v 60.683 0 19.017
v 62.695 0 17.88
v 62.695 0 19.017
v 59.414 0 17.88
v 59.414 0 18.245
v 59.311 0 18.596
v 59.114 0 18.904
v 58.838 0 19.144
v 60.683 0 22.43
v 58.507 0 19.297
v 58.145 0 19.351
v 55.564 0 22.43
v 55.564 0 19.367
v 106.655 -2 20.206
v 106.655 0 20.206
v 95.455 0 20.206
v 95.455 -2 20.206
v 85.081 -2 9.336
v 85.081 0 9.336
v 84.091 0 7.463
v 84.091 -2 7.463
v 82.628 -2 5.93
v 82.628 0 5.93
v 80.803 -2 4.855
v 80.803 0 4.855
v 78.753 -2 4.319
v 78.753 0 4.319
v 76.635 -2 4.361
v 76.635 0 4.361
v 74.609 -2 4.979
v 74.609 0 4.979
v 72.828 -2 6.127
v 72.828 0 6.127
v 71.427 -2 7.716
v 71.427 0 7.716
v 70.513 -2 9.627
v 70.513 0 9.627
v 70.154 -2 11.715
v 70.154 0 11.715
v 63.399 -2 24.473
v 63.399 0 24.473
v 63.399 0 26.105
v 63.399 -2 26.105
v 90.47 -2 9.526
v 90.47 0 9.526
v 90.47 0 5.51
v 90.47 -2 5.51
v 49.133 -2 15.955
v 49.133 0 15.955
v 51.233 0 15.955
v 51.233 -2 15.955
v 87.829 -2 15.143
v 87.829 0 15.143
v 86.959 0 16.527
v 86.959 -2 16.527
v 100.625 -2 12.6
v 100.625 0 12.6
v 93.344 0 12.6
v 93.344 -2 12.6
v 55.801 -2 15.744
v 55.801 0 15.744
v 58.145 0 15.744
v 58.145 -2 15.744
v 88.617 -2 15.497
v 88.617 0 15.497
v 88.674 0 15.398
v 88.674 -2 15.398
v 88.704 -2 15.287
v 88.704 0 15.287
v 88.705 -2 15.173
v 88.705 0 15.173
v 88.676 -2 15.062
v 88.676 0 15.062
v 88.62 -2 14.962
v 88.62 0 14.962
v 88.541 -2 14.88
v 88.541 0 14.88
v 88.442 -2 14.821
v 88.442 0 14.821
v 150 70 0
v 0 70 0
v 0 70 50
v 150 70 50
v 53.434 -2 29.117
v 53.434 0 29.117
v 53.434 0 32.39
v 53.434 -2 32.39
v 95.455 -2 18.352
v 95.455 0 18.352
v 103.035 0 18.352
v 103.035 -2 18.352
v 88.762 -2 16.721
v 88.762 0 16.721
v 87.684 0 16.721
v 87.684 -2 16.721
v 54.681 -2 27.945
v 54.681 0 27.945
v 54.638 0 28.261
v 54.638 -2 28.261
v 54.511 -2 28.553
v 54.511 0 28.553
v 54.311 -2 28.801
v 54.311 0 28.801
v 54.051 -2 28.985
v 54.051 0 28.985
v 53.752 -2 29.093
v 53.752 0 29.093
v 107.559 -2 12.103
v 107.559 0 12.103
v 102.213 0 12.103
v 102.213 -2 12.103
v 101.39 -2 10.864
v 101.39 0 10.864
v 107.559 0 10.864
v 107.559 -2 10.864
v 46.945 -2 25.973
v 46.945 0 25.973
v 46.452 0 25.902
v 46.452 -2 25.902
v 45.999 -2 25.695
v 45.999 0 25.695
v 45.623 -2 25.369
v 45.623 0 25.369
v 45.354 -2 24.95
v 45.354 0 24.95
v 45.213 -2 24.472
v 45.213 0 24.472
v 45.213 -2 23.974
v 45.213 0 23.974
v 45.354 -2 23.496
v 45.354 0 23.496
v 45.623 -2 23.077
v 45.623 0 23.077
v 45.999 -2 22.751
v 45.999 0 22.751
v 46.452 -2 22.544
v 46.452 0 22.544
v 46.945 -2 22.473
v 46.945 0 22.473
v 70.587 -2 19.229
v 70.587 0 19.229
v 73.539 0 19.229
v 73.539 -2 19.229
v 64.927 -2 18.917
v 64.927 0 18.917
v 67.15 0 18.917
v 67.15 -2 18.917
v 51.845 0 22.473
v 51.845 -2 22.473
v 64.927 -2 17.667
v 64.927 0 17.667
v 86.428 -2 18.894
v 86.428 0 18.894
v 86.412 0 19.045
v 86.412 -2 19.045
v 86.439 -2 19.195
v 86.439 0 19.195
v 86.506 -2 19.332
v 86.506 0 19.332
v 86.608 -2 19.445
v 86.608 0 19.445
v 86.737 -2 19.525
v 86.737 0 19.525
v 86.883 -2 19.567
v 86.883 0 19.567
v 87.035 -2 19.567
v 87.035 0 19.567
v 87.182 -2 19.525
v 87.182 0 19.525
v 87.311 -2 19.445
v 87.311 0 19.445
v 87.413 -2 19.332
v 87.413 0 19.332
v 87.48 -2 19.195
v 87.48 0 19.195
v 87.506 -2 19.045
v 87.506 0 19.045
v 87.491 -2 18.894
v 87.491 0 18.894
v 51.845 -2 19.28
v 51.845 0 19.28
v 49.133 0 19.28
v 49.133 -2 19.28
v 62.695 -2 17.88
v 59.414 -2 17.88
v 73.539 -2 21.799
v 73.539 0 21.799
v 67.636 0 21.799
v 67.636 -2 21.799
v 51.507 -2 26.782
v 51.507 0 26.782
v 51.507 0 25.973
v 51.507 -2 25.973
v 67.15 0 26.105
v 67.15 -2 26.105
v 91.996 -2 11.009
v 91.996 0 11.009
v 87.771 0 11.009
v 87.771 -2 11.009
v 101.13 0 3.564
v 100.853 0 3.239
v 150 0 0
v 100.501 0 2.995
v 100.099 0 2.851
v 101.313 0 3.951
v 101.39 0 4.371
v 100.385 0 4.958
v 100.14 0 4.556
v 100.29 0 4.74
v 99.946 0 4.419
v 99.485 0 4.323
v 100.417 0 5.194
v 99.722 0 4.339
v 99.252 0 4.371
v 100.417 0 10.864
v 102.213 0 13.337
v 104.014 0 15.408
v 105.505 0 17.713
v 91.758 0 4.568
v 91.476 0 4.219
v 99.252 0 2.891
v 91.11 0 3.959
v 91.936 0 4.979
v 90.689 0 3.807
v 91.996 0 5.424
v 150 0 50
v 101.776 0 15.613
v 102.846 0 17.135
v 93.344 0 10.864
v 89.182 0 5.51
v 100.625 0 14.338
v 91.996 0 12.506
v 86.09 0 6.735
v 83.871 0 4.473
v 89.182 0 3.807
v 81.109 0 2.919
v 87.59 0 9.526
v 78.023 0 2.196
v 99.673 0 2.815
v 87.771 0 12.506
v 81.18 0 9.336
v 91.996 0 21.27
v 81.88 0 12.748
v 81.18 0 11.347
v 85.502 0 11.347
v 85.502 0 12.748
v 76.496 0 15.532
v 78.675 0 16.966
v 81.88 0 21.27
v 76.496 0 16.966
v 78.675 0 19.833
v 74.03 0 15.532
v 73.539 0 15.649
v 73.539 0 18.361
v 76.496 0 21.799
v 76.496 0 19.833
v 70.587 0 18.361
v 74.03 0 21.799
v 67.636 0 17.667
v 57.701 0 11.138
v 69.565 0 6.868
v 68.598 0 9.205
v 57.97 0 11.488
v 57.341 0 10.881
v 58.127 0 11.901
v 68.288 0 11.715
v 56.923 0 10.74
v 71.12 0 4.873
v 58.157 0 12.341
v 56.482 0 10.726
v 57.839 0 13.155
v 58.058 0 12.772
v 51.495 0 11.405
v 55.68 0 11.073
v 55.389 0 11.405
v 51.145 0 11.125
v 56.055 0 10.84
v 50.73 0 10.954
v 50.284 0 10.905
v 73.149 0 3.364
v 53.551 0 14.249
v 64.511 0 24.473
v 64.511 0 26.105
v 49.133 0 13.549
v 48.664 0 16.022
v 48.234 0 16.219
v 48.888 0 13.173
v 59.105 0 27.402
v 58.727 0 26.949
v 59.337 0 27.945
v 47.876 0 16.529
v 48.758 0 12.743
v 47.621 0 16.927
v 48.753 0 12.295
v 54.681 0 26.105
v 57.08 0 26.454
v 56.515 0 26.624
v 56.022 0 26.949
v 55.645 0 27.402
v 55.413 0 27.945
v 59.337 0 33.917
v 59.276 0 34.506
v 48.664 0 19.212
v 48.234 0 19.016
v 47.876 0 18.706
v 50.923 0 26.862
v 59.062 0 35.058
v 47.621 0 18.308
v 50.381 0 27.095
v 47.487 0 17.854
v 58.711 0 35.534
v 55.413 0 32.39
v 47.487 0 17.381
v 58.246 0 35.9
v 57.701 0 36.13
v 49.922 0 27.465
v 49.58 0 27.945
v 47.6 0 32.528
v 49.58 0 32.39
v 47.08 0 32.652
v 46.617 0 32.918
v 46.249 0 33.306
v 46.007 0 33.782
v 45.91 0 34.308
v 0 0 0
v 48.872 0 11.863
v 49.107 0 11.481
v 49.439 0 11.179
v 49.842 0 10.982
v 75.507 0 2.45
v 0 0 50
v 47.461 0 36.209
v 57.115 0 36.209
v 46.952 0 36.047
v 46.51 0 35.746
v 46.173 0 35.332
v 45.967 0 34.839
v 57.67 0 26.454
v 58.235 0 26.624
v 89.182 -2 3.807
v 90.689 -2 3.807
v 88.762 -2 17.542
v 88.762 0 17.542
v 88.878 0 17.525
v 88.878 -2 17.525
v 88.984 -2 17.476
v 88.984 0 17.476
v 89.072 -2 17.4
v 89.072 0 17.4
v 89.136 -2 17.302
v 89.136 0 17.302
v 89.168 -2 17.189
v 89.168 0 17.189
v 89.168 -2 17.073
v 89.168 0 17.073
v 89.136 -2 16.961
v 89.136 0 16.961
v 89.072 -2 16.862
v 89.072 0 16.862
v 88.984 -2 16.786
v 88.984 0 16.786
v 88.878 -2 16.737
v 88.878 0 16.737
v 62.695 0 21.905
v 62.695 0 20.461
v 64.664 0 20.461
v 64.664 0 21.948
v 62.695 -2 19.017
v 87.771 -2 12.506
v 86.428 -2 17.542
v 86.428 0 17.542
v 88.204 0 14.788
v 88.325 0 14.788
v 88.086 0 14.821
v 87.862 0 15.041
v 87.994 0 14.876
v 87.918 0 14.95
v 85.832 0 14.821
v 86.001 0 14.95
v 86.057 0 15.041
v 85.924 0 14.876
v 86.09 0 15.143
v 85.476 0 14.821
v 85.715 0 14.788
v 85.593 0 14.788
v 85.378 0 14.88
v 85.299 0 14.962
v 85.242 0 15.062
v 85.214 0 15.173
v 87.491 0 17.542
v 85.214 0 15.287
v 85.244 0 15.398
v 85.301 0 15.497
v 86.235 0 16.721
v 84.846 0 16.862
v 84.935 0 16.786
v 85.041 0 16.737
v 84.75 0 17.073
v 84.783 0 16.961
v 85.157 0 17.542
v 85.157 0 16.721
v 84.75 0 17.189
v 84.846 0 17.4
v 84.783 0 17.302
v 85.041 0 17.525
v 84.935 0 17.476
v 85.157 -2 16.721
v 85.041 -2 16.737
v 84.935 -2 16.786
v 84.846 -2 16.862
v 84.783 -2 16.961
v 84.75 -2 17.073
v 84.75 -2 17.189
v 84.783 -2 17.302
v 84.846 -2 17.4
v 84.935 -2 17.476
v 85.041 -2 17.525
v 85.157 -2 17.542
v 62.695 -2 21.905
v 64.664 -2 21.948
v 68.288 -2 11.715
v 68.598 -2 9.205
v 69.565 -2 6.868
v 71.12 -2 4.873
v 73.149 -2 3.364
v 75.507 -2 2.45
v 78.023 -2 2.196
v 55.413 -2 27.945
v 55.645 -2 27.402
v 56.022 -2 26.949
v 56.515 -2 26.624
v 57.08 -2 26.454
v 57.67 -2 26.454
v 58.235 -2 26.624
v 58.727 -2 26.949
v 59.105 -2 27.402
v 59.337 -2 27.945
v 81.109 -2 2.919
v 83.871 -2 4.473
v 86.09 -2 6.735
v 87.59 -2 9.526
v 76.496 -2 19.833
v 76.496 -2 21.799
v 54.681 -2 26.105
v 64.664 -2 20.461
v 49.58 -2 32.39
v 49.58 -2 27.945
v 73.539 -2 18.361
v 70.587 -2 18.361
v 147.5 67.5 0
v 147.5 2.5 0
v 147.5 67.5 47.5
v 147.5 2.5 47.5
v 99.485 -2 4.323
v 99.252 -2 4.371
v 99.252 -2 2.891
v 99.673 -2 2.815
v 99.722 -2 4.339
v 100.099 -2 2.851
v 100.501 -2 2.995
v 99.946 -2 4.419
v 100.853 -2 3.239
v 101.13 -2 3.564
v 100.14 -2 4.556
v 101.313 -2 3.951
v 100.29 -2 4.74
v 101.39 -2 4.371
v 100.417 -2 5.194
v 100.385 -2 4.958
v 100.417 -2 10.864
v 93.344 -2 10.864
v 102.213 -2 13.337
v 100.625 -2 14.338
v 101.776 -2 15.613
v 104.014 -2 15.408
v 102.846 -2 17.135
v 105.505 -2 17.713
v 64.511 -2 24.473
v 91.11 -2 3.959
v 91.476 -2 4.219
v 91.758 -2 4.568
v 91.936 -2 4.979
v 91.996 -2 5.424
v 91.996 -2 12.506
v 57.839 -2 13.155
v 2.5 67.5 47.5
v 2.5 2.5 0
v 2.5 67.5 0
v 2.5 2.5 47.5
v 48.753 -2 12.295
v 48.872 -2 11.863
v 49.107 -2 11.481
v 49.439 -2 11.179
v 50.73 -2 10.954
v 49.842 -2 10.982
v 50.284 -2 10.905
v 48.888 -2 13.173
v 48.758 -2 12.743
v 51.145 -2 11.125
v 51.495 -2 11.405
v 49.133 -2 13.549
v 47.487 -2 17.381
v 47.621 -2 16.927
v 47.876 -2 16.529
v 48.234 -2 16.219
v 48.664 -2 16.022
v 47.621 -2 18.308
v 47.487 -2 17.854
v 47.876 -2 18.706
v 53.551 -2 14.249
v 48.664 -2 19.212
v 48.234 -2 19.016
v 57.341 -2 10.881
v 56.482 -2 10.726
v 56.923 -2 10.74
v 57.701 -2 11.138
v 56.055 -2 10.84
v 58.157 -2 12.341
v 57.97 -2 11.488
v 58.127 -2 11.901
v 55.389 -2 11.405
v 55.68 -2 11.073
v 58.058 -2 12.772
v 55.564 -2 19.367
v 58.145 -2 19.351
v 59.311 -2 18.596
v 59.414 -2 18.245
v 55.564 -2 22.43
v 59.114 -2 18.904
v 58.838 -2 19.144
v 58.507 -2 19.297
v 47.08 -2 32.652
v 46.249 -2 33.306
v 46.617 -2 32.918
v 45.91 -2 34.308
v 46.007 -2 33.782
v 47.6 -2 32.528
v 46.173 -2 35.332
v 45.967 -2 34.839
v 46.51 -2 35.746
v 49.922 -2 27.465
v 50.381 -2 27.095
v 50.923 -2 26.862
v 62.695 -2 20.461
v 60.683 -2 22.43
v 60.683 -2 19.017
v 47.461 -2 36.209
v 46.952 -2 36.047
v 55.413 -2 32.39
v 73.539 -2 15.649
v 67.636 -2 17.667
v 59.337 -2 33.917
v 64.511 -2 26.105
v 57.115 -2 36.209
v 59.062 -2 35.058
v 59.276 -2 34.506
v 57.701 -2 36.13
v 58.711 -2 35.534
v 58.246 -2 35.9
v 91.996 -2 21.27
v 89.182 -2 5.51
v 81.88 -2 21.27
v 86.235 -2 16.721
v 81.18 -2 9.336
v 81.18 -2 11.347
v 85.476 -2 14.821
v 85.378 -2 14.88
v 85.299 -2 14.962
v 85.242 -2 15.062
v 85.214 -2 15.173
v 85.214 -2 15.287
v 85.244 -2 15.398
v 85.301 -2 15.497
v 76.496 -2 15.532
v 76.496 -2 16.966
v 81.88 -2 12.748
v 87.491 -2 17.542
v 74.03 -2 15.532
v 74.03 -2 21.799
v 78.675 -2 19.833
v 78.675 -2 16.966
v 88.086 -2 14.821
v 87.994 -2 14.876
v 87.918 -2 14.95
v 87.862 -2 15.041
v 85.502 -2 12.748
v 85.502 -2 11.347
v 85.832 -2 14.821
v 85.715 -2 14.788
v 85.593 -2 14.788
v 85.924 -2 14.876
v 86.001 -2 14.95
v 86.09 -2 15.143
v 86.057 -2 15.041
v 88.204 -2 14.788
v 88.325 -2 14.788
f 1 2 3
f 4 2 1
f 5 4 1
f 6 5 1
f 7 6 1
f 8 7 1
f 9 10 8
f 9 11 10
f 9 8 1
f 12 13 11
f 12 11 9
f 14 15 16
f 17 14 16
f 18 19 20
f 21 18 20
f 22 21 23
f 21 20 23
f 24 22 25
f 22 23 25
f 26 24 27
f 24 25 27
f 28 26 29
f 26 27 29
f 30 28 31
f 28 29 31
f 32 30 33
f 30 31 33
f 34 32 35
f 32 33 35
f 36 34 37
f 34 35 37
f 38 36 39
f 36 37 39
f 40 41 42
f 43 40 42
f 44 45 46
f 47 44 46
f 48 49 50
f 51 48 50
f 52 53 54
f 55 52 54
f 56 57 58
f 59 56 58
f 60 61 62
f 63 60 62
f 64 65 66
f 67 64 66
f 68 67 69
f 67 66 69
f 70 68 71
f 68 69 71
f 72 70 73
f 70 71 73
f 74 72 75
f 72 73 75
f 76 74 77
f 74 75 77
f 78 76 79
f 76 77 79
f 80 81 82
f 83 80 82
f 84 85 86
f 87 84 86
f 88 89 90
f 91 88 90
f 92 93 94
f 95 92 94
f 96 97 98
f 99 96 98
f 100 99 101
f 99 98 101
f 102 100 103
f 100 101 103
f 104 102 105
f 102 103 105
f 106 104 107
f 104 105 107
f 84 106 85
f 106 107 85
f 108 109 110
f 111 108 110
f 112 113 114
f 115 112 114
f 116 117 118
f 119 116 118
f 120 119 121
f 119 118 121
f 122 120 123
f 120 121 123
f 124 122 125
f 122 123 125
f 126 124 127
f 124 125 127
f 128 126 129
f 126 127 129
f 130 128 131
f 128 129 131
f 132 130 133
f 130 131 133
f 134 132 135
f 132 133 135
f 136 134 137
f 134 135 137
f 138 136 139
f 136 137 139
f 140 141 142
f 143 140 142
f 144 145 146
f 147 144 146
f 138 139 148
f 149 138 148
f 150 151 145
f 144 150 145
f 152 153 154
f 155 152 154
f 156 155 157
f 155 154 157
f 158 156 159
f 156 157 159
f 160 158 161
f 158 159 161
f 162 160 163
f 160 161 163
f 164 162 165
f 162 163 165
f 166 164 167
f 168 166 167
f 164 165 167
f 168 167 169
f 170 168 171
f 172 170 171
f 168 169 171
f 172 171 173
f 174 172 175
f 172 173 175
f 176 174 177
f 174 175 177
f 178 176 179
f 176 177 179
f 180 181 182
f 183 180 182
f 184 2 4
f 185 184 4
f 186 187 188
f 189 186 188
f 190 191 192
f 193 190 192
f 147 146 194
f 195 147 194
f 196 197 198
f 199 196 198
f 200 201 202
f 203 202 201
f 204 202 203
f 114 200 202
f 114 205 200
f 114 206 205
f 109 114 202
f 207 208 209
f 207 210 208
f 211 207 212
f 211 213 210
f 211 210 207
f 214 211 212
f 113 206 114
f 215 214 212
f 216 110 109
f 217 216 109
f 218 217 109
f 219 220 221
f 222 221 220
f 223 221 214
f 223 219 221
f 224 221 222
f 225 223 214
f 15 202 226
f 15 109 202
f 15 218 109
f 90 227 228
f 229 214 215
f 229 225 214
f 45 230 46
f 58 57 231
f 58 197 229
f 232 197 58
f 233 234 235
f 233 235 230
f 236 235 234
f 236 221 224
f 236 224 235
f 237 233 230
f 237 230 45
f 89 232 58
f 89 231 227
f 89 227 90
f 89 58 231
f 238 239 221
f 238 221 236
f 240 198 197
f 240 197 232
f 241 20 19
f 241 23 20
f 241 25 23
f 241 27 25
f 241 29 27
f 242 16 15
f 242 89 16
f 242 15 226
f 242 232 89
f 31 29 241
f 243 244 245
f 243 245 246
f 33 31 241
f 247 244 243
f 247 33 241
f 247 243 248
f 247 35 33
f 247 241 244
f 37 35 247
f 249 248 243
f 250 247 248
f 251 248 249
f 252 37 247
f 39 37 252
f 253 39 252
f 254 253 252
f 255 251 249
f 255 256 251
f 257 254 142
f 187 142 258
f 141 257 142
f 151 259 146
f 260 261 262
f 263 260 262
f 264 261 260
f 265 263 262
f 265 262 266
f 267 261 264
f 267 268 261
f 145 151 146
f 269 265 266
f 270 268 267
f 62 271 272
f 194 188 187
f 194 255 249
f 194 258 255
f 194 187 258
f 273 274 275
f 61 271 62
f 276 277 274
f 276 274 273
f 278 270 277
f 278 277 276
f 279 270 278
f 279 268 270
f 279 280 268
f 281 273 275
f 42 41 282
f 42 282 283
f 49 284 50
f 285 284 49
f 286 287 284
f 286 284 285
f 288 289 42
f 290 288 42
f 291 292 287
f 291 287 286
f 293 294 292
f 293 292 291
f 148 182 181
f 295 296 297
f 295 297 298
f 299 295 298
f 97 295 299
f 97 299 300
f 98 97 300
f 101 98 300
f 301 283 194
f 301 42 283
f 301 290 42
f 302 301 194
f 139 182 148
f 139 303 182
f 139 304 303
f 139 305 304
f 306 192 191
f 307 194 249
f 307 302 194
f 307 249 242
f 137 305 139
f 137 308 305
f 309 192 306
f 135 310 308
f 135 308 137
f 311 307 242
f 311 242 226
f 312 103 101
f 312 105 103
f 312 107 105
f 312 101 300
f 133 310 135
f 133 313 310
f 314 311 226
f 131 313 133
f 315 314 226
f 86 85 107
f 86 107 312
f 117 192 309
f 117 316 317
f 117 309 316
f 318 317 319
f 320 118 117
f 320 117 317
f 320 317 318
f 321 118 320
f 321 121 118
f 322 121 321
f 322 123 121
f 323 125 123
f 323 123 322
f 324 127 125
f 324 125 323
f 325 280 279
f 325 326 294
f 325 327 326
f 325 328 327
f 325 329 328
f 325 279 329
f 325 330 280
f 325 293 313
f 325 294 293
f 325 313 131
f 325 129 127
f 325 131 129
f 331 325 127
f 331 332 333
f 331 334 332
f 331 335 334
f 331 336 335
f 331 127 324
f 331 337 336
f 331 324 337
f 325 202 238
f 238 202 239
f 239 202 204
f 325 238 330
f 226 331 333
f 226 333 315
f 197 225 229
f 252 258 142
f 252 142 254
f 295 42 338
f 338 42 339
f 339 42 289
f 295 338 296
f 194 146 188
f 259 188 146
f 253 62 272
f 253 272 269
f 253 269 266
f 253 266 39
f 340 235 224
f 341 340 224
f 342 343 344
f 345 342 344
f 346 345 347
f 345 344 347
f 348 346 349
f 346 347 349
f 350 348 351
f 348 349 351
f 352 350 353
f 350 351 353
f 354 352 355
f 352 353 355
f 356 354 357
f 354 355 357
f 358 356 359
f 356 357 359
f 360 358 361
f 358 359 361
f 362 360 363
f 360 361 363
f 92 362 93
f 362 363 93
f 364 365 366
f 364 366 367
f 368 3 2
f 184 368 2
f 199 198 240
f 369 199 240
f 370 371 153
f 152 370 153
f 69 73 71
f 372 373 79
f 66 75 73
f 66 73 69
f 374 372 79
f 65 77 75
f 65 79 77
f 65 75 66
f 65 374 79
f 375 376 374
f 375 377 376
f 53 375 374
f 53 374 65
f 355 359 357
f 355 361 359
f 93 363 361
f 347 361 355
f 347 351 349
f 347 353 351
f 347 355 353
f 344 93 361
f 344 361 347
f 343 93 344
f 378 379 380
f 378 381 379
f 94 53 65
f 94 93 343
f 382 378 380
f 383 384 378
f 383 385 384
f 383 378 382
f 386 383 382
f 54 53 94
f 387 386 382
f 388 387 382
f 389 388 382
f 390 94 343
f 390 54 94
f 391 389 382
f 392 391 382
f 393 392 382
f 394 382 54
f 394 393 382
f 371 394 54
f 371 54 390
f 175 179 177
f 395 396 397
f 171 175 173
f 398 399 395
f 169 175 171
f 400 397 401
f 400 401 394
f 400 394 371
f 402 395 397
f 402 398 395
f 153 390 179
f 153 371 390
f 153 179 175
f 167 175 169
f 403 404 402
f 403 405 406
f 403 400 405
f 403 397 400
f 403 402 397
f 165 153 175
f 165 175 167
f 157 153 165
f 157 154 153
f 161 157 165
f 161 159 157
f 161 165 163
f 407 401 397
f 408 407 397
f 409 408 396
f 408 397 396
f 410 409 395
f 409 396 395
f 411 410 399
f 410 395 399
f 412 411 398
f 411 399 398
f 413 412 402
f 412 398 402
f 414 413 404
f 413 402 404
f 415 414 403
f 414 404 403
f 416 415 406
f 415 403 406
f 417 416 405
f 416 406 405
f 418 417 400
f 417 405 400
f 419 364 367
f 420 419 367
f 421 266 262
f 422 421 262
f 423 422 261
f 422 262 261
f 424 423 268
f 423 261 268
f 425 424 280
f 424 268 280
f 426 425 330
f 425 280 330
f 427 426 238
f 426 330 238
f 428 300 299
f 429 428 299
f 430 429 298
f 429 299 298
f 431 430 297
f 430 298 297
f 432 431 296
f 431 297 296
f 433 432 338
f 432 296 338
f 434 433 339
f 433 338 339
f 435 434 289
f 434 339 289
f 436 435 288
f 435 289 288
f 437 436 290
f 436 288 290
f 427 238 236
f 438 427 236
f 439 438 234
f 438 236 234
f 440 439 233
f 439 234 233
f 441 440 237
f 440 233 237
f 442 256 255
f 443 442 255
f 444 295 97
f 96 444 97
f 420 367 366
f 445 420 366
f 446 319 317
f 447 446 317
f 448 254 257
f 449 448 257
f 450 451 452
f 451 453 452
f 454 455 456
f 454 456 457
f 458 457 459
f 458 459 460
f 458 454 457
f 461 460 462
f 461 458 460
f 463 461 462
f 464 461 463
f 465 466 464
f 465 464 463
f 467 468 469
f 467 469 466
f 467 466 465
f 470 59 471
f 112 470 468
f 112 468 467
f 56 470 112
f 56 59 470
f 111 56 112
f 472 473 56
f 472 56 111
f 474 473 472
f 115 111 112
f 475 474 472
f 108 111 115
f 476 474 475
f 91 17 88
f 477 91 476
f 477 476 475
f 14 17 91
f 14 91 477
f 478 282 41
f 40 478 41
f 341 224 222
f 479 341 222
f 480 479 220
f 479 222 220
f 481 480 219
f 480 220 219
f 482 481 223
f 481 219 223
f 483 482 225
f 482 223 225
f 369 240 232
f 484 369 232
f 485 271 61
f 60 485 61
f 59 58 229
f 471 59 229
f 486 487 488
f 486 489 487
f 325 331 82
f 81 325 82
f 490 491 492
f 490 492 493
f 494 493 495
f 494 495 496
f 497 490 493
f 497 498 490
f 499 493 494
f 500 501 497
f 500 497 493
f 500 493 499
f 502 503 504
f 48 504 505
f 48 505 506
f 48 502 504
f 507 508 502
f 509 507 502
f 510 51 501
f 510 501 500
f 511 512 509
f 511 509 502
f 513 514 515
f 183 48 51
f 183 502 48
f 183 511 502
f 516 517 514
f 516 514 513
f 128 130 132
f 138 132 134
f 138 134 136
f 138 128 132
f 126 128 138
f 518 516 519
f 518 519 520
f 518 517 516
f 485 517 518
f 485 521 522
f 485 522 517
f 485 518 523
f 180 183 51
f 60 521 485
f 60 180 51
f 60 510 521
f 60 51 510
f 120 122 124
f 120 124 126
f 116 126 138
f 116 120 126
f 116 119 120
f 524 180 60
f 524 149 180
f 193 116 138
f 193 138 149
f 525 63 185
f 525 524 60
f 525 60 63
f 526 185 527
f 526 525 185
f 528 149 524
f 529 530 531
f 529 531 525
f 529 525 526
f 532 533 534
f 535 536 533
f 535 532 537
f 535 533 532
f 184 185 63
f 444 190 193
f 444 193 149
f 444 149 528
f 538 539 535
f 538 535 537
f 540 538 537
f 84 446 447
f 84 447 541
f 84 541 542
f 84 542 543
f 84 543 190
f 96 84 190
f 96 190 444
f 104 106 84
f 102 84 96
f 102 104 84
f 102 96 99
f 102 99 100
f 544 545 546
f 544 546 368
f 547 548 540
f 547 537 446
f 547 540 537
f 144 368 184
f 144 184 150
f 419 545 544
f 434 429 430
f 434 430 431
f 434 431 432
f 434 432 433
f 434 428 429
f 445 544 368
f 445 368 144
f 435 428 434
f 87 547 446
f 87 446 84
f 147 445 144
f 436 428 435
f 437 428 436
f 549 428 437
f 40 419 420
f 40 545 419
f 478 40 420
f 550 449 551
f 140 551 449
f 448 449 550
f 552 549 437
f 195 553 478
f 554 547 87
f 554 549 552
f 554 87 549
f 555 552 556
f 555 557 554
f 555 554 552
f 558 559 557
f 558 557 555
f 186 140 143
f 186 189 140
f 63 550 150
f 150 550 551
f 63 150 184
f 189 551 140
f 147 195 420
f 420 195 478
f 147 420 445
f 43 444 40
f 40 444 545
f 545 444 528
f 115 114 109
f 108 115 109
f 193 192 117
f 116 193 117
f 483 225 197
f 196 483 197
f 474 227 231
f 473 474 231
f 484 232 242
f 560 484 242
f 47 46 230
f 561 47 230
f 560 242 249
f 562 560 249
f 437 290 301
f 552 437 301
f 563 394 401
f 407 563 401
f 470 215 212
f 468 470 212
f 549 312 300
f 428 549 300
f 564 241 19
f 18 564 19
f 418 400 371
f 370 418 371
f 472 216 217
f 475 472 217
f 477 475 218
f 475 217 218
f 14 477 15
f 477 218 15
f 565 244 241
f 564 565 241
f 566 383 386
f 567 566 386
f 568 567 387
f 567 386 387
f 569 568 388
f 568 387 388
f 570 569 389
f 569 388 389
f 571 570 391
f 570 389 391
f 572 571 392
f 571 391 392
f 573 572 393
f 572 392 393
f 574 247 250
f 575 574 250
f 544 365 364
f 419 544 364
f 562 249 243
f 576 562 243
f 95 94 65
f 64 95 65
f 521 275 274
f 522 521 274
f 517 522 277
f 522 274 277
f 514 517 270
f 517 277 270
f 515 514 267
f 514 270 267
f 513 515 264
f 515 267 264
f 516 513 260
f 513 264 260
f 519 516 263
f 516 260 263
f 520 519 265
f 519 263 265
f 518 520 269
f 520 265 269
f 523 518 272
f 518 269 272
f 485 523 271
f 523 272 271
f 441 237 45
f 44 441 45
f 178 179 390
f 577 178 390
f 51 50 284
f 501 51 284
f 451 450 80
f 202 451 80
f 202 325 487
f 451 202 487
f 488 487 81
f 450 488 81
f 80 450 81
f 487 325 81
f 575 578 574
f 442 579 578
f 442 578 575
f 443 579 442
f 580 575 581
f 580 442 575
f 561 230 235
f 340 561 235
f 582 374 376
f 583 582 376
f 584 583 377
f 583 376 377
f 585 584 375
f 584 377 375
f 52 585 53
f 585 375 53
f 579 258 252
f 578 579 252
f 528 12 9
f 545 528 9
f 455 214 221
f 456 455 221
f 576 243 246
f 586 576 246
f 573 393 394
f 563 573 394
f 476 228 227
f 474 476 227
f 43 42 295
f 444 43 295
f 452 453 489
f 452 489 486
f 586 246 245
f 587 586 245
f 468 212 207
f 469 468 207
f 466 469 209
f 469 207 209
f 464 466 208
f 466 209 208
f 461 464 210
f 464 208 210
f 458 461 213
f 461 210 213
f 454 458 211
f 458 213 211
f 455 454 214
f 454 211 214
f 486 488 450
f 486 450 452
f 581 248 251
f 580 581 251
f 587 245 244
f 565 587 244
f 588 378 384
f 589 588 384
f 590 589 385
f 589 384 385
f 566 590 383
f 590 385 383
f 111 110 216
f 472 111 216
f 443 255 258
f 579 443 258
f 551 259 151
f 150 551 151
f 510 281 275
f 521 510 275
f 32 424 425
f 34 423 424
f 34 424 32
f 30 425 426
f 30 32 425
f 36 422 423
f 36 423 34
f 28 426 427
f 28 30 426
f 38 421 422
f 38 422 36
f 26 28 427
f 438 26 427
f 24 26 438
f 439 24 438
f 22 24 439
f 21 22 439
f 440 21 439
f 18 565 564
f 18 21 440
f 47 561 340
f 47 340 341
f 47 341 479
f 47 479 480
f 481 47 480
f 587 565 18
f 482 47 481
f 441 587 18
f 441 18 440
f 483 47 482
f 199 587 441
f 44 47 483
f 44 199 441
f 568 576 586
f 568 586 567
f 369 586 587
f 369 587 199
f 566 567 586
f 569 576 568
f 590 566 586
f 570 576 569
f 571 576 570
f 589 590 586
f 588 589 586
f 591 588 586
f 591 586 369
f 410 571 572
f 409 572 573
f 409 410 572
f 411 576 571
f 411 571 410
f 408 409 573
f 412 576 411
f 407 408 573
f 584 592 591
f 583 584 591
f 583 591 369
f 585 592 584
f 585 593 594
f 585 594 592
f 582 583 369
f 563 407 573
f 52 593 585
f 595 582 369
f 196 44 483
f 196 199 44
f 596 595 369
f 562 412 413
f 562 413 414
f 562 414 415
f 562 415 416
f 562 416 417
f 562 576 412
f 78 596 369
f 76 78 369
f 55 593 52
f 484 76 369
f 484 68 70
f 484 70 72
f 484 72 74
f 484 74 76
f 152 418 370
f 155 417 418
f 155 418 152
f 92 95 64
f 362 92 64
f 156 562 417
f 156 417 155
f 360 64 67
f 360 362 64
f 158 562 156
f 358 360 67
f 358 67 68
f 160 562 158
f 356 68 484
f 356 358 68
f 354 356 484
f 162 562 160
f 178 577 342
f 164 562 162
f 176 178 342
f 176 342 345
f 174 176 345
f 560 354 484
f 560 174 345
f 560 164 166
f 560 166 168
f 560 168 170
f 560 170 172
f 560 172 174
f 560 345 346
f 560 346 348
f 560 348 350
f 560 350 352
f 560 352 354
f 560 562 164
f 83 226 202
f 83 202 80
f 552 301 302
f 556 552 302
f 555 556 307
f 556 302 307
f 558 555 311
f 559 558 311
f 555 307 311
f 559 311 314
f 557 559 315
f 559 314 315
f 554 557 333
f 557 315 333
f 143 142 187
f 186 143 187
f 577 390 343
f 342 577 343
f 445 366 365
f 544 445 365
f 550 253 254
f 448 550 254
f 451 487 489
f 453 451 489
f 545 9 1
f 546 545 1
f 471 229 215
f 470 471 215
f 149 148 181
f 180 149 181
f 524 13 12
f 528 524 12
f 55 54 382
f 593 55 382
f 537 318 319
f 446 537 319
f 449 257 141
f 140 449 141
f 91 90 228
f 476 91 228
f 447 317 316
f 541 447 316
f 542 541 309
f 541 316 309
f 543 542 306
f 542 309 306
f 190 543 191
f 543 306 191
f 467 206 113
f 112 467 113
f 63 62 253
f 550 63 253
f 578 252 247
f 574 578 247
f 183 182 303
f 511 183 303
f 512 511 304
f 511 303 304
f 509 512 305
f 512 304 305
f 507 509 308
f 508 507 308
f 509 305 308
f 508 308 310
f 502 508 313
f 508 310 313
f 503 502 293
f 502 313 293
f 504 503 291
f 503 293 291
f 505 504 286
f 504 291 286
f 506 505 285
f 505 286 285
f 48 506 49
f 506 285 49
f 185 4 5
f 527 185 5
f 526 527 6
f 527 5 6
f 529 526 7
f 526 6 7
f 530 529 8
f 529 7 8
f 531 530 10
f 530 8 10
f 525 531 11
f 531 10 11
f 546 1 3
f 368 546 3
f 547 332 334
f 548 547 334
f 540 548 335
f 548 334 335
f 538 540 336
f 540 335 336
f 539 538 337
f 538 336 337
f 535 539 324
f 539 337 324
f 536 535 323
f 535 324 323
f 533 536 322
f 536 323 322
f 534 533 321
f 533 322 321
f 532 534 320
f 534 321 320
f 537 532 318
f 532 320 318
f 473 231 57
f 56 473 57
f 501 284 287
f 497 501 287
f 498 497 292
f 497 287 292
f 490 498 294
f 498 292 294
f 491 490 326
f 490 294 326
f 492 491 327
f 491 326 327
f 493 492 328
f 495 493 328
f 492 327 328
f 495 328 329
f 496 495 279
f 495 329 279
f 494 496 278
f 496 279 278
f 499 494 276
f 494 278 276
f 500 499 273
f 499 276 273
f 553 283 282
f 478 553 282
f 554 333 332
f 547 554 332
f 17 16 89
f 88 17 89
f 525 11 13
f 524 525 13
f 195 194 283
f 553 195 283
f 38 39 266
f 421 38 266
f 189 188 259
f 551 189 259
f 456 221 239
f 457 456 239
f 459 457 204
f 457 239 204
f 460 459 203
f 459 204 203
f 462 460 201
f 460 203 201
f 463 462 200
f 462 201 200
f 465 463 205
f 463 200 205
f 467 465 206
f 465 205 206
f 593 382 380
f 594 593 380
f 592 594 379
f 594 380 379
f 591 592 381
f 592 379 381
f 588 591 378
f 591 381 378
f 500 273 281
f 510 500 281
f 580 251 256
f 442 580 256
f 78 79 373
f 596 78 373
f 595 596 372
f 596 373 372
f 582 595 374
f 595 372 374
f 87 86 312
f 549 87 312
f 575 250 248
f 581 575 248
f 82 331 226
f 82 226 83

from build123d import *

# Parameters (mm, degrees)
F0_W     = 70
F0_H     = 50
F1_DEPTH = 150
F2_T     = -2.5
F4_DEPTH = 2


with BuildPart() as f1:
    # F0 (on Right) → F1 (new body)
    with BuildSketch(Plane.YZ):
        with Locations((35, 25)):
            Rectangle(F0_W, F0_H)
    extrude(amount=F1_DEPTH)

    # F2
    f2_openings = [f1.faces().sort_by_distance(p)[0] for p in [
        (75, 35, 0),
    ]]
    offset(amount=F2_T, openings=f2_openings)

    # F3 (on Front) → F4 (join)
    with BuildSketch(Plane.XZ):
        with BuildLine():
            Line((57.11453, 36.209103), (47.46139, 36.209103))
            ThreePointArc((47.46139, 36.209103), (45.909707, 34.307581), (47.600284, 32.528408))
            Line((47.600284, 32.528408), (49.579524, 32.389514))
            Line((49.579524, 32.389514), (49.579524, 27.944904))
            ThreePointArc((49.579524, 27.944904), (50.38126, 27.095251), (51.50668, 26.782002))
            ThreePointArc((51.50668, 26.782002), (52.632099, 27.095251), (53.433836, 27.944904))
            Line((53.433836, 27.944904), (53.433836, 29.116847))
            Line((53.433836, 29.116847), (53.433836, 32.389514))
            Line((53.433836, 32.389514), (55.413075, 32.389514))
            Line((55.413075, 32.389514), (55.413075, 27.944904))
            ThreePointArc((55.413075, 27.944904), (57.374954, 26.432392), (59.336834, 27.944904))
            Line((59.336834, 27.944904), (59.336834, 33.917353))
            ThreePointArc((59.336834, 33.917353), (58.710678, 35.533527), (57.11453, 36.209103))
        make_face()
        with BuildLine():
            ThreePointArc((53.433836, 27.944904), (52.632099, 27.095251), (51.50668, 26.782002))
            Line((51.50668, 26.782002), (51.50668, 25.973246))
            Line((51.50668, 25.973246), (46.945356, 25.973246))
            ThreePointArc((46.945356, 25.973246), (45.1954, 24.223289), (46.945356, 22.473333))
            Line((46.945356, 22.473333), (51.845234, 22.473333))
            Line((51.845234, 22.473333), (51.845234, 19.279664))
            Line((51.845234, 19.279664), (49.132802, 19.279664))
            ThreePointArc((49.132802, 19.279664), (47.470343, 17.617206), (49.132802, 15.954748))
            Line((49.132802, 15.954748), (51.232748, 15.954748))
            Line((51.232748, 15.954748), (49.132802, 13.548559))
            ThreePointArc((49.132802, 13.548559), (49.262718, 11.31813), (51.495243, 11.404863))
            Line((51.495243, 11.404863), (53.551439, 14.24854))
            Line((53.551439, 14.24854), (55.388894, 11.404863))
            ThreePointArc((55.388894, 11.404863), (57.530578, 10.996438), (57.838831, 13.154818))
            Line((57.838831, 13.154818), (55.80093, 15.74391))
            Line((55.80093, 15.74391), (58.145076, 15.74391))
            Line((58.145076, 15.74391), (73.538758, 15.648505))
            Line((73.538758, 15.648505), (73.538758, 18.361211))
            Line((73.538758, 18.361211), (70.587255, 18.361211))
            Line((70.587255, 18.361211), (70.587255, 19.2293))
            Line((70.587255, 19.2293), (73.538758, 19.2293))
            Line((73.538758, 19.2293), (73.538758, 21.79884))
            Line((73.538758, 21.79884), (67.63576, 21.79884))
            Line((67.63576, 21.79884), (67.63576, 17.66674))
            Line((67.63576, 17.66674), (64.927325, 17.66674))
            Line((64.927325, 17.66674), (64.927325, 18.916788))
            Line((64.927325, 18.916788), (67.149632, 18.916788))
            Line((67.149632, 18.916788), (67.149632, 26.104558))
            Line((67.149632, 26.104558), (64.510643, 26.104558))
            Line((64.510643, 26.104558), (64.510643, 24.472551))
            Line((64.510643, 24.472551), (63.399486, 24.472551))
            Line((63.399486, 24.472551), (63.399486, 26.104558))
            Line((63.399486, 26.104558), (54.681171, 26.104558))
            Line((54.681171, 26.104558), (54.681171, 27.944904))
            ThreePointArc((54.681171, 27.944904), (54.310984, 28.800663), (53.433836, 29.116847))
            Line((53.433836, 29.116847), (53.433836, 27.944904))
        make_face()
        with BuildLine():
            Line((55.563889, 19.367162), (55.563889, 22.429585))
            Line((55.563889, 22.429585), (60.682509, 22.429585))
            Line((60.682509, 22.429585), (60.682509, 19.017169))
            Line((60.682509, 19.017169), (62.694959, 19.017169))
            Line((62.694959, 19.017169), (62.694959, 17.8797))
            Line((62.694959, 17.8797), (59.413794, 17.8797))
            ThreePointArc((59.413794, 17.8797), (59.113771, 18.903701), (58.145076, 19.351165))
            Line((58.145076, 19.351165), (55.563889, 19.367162))
        make_face(mode=Mode.SUBTRACT)
        Polygon((62.694959, 20.460883), (62.694959, 21.904599), (64.663664, 21.948347), (64.663664, 20.460883), align=None, mode=Mode.SUBTRACT)
        Polygon((76.495692, 21.79884), (74.030101, 21.79884), (74.030101, 15.532267), (76.495692, 15.532267), (76.495692, 16.965751), (78.674585, 16.965751), (78.674585, 19.832715), (76.495692, 19.832715), align=None)
        with BuildLine():
            Line((91.996334, 12.50622), (91.996334, 21.270147))
            Line((91.996334, 21.270147), (81.880391, 21.270147))
            Line((81.880391, 21.270147), (81.880391, 12.74765))
            Line((81.880391, 12.74765), (85.50185, 12.74765))
            Line((85.50185, 12.74765), (85.50185, 11.347353))
            Line((85.50185, 11.347353), (81.180245, 11.347353))
            Line((81.180245, 11.347353), (81.180245, 9.633197))
            Line((81.180245, 9.633197), (81.180245, 9.335577))
            Line((81.180245, 9.335577), (85.081376, 9.335577))
            ThreePointArc((85.081376, 9.335577), (76.634992, 4.361003), (70.154078, 11.715291))
            Line((70.154078, 11.715291), (68.28817, 11.715291))
            ThreePointArc((68.28817, 11.715291), (71.119618, 4.873442), (78.023359, 2.196435))
            ThreePointArc((78.023359, 2.196435), (83.870671, 4.472691), (87.590158, 9.526185))
            Line((87.590158, 9.526185), (90.47015, 9.526185))
            Line((90.47015, 9.526185), (90.47015, 5.510417))
            Line((90.47015, 5.510417), (89.181907, 5.510417))
            Line((89.181907, 5.510417), (89.181907, 3.806551))
            Line((89.181907, 3.806551), (90.68878, 3.806551))
            ThreePointArc((90.68878, 3.806551), (91.62855, 4.383871), (91.996334, 5.423679))
            Line((91.996334, 5.423679), (91.996334, 11.00935))
            Line((91.996334, 11.00935), (87.771297, 11.00935))
            Line((87.771297, 11.00935), (87.771297, 12.50622))
            Line((87.771297, 12.50622), (91.996334, 12.50622))
        make_face()
        with BuildLine():
            ThreePointArc((86.42818, 18.893627), (86.959373, 19.572715), (87.490566, 18.893627))
            Line((87.490566, 18.893627), (87.490566, 17.541504))
            Line((87.490566, 17.541504), (88.762209, 17.541504))
            ThreePointArc((88.762209, 17.541504), (89.172675, 17.131037), (88.762209, 16.720571))
            Line((88.762209, 16.720571), (87.683722, 16.720571))
            Line((87.683722, 16.720571), (88.617332, 15.497221))
            ThreePointArc((88.617332, 15.497221), (88.694215, 15.11667), (88.442416, 14.821159))
            ThreePointArc((88.442416, 14.821159), (88.264398, 14.783906), (88.086381, 14.821159))
            Line((88.086381, 14.821159), (87.764211, 14.821159))
            Line((87.764211, 14.821159), (86.186729, 14.821159))
            Line((86.186729, 14.821159), (85.832366, 14.821159))
            ThreePointArc((85.832366, 14.821159), (85.654348, 14.783906), (85.476331, 14.821159))
            ThreePointArc((85.476331, 14.821159), (85.224532, 15.11667), (85.301414, 15.497221))
            Line((85.301414, 15.497221), (86.235024, 16.720571))
            Line((86.235024, 16.720571), (85.156538, 16.720571))
            ThreePointArc((85.156538, 16.720571), (84.746071, 17.131037), (85.156538, 17.541504))
            Line((85.156538, 17.541504), (86.42818, 17.541504))
            Line((86.42818, 17.541504), (86.42818, 18.893627))
        make_face(mode=Mode.SUBTRACT)
        with BuildLine():
            Line((106.654562, 20.205654), (95.455378, 20.205654))
            Line((95.455378, 20.205654), (95.455378, 18.35208))
            Line((95.455378, 18.35208), (101.575367, 18.35208))
            Line((101.575367, 18.35208), (103.034772, 18.35208))
            Line((103.034772, 18.35208), (102.845654, 17.135097))
            Line((102.845654, 17.135097), (101.776361, 15.61341))
            Line((101.776361, 15.61341), (100.624815, 14.338483))
            Line((100.624815, 14.338483), (100.624815, 12.600102))
            Line((100.624815, 12.600102), (93.343966, 12.600102))
            Line((93.343966, 12.600102), (93.343966, 10.864255))
            Line((93.343966, 10.864255), (100.416891, 10.864255))
            Line((100.416891, 10.864255), (100.416891, 5.193939))
            ThreePointArc((100.416891, 5.193939), (100.047414, 4.480832), (99.251762, 4.371406))
            Line((99.251762, 4.371406), (99.251762, 2.890847))
            ThreePointArc((99.251762, 2.890847), (100.685052, 3.105352), (101.390347, 4.371406))
            Line((101.390347, 4.371406), (101.390347, 10.864255))
            Line((101.390347, 10.864255), (107.559353, 10.864255))
            Line((107.559353, 10.864255), (107.559353, 12.103219))
            Line((107.559353, 12.103219), (102.212884, 12.103219))
            Line((102.212884, 12.103219), (102.212884, 13.337018))
            ThreePointArc((102.212884, 13.337018), (104.800372, 16.534238), (106.654562, 20.205654))
        make_face()
        with BuildLine():
            Line((87.764211, 14.821159), (88.086381, 14.821159))
            ThreePointArc((88.086381, 14.821159), (87.917839, 14.950376), (87.828599, 15.143093))
            Line((87.828599, 15.143093), (86.959373, 16.527411))
            Line((86.959373, 16.527411), (86.090147, 15.143093))
            ThreePointArc((86.090147, 15.143093), (86.000907, 14.950376), (85.832366, 14.821159))
            Line((85.832366, 14.821159), (86.186729, 14.821159))
            Line((86.186729, 14.821159), (87.764211, 14.821159))
        make_face()
    extrude(amount=F4_DEPTH)


solid = f1.part
